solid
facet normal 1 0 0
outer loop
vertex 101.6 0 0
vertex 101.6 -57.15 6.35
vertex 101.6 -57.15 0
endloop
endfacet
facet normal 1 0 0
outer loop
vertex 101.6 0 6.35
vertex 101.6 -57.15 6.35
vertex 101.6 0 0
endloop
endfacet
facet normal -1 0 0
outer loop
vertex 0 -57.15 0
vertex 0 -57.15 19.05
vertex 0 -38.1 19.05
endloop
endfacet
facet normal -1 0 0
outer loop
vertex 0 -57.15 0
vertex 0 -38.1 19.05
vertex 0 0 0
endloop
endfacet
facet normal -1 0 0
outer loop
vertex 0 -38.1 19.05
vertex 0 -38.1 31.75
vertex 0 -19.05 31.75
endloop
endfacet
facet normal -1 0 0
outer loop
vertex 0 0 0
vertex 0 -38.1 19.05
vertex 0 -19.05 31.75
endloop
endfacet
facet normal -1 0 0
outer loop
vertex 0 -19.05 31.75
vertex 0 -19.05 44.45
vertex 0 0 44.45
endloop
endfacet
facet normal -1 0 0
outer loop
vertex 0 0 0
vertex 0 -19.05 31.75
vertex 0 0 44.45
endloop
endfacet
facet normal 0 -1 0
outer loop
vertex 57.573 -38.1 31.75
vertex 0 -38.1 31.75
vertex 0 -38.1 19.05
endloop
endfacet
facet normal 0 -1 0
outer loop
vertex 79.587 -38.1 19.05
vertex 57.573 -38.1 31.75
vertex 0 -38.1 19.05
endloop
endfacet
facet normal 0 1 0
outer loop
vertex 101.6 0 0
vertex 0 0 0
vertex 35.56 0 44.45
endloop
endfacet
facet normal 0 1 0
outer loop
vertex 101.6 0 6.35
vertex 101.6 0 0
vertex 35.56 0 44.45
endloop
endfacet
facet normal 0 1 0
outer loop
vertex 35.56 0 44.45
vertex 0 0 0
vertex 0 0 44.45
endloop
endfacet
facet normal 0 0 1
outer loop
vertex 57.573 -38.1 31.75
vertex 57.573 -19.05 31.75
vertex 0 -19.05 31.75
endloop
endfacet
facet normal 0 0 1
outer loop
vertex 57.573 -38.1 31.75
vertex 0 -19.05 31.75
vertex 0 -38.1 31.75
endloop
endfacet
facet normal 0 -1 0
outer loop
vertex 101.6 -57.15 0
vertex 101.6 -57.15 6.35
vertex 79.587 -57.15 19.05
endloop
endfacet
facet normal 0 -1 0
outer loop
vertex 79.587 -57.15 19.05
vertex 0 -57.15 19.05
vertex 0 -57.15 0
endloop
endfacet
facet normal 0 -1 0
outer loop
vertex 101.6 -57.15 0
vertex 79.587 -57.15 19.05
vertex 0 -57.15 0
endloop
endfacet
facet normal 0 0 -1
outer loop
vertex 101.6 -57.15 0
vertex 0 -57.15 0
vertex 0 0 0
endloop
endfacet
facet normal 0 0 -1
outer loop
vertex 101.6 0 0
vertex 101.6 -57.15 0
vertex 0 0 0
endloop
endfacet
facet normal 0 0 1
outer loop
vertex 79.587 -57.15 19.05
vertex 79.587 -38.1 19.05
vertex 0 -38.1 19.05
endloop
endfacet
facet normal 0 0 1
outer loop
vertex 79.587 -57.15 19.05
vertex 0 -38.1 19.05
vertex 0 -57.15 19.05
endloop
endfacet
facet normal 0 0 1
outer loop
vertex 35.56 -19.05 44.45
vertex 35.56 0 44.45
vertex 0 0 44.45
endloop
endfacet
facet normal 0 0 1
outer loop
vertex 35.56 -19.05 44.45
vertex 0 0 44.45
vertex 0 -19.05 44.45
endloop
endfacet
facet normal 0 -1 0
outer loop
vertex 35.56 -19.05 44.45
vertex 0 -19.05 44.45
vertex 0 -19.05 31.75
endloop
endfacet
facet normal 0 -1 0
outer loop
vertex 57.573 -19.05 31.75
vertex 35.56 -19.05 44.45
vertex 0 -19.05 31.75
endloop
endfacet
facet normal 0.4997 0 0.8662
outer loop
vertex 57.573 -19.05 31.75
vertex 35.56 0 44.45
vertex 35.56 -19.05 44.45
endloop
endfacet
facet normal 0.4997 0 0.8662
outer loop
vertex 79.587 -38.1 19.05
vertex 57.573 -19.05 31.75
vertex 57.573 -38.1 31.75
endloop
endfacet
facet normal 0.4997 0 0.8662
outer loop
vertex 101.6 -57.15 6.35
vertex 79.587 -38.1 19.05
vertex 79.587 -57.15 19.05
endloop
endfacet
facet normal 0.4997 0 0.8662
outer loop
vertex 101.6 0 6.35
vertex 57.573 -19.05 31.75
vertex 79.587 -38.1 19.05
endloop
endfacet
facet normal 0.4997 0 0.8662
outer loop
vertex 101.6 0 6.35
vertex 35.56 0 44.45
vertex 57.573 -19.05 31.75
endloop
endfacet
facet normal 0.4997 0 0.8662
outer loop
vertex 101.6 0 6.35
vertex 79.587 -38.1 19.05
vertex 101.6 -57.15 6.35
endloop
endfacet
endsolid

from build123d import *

# Parameters (mm, degrees)
F0_W     = 57.15
F0_H     = 6.35
F1_DEPTH = 101.6
F3_DEPTH = 57.15


with BuildPart() as f1:
    # F0 (on Right) → F1 (new body)
    with BuildSketch(Plane.YZ):
        Polygon((0, 6.35), (0, 44.45), (-19.05, 44.45), (-19.05, 31.75), (-38.1, 31.75), (-38.1, 19.05), (-57.15, 19.05), (-57.15, 6.35), align=None)
        with Locations((-28.575, 3.175)):
            Rectangle(F0_W, F0_H)
    extrude(amount=F1_DEPTH)

    # F2 (on Front) → F3 (cut)
    with BuildSketch(Plane.XZ):
        Polygon((101.6, 44.45), (35.56, 44.45), (101.6, 6.35), align=None)
    extrude(amount=F3_DEPTH, mode=Mode.SUBTRACT)


solid = f1.part
